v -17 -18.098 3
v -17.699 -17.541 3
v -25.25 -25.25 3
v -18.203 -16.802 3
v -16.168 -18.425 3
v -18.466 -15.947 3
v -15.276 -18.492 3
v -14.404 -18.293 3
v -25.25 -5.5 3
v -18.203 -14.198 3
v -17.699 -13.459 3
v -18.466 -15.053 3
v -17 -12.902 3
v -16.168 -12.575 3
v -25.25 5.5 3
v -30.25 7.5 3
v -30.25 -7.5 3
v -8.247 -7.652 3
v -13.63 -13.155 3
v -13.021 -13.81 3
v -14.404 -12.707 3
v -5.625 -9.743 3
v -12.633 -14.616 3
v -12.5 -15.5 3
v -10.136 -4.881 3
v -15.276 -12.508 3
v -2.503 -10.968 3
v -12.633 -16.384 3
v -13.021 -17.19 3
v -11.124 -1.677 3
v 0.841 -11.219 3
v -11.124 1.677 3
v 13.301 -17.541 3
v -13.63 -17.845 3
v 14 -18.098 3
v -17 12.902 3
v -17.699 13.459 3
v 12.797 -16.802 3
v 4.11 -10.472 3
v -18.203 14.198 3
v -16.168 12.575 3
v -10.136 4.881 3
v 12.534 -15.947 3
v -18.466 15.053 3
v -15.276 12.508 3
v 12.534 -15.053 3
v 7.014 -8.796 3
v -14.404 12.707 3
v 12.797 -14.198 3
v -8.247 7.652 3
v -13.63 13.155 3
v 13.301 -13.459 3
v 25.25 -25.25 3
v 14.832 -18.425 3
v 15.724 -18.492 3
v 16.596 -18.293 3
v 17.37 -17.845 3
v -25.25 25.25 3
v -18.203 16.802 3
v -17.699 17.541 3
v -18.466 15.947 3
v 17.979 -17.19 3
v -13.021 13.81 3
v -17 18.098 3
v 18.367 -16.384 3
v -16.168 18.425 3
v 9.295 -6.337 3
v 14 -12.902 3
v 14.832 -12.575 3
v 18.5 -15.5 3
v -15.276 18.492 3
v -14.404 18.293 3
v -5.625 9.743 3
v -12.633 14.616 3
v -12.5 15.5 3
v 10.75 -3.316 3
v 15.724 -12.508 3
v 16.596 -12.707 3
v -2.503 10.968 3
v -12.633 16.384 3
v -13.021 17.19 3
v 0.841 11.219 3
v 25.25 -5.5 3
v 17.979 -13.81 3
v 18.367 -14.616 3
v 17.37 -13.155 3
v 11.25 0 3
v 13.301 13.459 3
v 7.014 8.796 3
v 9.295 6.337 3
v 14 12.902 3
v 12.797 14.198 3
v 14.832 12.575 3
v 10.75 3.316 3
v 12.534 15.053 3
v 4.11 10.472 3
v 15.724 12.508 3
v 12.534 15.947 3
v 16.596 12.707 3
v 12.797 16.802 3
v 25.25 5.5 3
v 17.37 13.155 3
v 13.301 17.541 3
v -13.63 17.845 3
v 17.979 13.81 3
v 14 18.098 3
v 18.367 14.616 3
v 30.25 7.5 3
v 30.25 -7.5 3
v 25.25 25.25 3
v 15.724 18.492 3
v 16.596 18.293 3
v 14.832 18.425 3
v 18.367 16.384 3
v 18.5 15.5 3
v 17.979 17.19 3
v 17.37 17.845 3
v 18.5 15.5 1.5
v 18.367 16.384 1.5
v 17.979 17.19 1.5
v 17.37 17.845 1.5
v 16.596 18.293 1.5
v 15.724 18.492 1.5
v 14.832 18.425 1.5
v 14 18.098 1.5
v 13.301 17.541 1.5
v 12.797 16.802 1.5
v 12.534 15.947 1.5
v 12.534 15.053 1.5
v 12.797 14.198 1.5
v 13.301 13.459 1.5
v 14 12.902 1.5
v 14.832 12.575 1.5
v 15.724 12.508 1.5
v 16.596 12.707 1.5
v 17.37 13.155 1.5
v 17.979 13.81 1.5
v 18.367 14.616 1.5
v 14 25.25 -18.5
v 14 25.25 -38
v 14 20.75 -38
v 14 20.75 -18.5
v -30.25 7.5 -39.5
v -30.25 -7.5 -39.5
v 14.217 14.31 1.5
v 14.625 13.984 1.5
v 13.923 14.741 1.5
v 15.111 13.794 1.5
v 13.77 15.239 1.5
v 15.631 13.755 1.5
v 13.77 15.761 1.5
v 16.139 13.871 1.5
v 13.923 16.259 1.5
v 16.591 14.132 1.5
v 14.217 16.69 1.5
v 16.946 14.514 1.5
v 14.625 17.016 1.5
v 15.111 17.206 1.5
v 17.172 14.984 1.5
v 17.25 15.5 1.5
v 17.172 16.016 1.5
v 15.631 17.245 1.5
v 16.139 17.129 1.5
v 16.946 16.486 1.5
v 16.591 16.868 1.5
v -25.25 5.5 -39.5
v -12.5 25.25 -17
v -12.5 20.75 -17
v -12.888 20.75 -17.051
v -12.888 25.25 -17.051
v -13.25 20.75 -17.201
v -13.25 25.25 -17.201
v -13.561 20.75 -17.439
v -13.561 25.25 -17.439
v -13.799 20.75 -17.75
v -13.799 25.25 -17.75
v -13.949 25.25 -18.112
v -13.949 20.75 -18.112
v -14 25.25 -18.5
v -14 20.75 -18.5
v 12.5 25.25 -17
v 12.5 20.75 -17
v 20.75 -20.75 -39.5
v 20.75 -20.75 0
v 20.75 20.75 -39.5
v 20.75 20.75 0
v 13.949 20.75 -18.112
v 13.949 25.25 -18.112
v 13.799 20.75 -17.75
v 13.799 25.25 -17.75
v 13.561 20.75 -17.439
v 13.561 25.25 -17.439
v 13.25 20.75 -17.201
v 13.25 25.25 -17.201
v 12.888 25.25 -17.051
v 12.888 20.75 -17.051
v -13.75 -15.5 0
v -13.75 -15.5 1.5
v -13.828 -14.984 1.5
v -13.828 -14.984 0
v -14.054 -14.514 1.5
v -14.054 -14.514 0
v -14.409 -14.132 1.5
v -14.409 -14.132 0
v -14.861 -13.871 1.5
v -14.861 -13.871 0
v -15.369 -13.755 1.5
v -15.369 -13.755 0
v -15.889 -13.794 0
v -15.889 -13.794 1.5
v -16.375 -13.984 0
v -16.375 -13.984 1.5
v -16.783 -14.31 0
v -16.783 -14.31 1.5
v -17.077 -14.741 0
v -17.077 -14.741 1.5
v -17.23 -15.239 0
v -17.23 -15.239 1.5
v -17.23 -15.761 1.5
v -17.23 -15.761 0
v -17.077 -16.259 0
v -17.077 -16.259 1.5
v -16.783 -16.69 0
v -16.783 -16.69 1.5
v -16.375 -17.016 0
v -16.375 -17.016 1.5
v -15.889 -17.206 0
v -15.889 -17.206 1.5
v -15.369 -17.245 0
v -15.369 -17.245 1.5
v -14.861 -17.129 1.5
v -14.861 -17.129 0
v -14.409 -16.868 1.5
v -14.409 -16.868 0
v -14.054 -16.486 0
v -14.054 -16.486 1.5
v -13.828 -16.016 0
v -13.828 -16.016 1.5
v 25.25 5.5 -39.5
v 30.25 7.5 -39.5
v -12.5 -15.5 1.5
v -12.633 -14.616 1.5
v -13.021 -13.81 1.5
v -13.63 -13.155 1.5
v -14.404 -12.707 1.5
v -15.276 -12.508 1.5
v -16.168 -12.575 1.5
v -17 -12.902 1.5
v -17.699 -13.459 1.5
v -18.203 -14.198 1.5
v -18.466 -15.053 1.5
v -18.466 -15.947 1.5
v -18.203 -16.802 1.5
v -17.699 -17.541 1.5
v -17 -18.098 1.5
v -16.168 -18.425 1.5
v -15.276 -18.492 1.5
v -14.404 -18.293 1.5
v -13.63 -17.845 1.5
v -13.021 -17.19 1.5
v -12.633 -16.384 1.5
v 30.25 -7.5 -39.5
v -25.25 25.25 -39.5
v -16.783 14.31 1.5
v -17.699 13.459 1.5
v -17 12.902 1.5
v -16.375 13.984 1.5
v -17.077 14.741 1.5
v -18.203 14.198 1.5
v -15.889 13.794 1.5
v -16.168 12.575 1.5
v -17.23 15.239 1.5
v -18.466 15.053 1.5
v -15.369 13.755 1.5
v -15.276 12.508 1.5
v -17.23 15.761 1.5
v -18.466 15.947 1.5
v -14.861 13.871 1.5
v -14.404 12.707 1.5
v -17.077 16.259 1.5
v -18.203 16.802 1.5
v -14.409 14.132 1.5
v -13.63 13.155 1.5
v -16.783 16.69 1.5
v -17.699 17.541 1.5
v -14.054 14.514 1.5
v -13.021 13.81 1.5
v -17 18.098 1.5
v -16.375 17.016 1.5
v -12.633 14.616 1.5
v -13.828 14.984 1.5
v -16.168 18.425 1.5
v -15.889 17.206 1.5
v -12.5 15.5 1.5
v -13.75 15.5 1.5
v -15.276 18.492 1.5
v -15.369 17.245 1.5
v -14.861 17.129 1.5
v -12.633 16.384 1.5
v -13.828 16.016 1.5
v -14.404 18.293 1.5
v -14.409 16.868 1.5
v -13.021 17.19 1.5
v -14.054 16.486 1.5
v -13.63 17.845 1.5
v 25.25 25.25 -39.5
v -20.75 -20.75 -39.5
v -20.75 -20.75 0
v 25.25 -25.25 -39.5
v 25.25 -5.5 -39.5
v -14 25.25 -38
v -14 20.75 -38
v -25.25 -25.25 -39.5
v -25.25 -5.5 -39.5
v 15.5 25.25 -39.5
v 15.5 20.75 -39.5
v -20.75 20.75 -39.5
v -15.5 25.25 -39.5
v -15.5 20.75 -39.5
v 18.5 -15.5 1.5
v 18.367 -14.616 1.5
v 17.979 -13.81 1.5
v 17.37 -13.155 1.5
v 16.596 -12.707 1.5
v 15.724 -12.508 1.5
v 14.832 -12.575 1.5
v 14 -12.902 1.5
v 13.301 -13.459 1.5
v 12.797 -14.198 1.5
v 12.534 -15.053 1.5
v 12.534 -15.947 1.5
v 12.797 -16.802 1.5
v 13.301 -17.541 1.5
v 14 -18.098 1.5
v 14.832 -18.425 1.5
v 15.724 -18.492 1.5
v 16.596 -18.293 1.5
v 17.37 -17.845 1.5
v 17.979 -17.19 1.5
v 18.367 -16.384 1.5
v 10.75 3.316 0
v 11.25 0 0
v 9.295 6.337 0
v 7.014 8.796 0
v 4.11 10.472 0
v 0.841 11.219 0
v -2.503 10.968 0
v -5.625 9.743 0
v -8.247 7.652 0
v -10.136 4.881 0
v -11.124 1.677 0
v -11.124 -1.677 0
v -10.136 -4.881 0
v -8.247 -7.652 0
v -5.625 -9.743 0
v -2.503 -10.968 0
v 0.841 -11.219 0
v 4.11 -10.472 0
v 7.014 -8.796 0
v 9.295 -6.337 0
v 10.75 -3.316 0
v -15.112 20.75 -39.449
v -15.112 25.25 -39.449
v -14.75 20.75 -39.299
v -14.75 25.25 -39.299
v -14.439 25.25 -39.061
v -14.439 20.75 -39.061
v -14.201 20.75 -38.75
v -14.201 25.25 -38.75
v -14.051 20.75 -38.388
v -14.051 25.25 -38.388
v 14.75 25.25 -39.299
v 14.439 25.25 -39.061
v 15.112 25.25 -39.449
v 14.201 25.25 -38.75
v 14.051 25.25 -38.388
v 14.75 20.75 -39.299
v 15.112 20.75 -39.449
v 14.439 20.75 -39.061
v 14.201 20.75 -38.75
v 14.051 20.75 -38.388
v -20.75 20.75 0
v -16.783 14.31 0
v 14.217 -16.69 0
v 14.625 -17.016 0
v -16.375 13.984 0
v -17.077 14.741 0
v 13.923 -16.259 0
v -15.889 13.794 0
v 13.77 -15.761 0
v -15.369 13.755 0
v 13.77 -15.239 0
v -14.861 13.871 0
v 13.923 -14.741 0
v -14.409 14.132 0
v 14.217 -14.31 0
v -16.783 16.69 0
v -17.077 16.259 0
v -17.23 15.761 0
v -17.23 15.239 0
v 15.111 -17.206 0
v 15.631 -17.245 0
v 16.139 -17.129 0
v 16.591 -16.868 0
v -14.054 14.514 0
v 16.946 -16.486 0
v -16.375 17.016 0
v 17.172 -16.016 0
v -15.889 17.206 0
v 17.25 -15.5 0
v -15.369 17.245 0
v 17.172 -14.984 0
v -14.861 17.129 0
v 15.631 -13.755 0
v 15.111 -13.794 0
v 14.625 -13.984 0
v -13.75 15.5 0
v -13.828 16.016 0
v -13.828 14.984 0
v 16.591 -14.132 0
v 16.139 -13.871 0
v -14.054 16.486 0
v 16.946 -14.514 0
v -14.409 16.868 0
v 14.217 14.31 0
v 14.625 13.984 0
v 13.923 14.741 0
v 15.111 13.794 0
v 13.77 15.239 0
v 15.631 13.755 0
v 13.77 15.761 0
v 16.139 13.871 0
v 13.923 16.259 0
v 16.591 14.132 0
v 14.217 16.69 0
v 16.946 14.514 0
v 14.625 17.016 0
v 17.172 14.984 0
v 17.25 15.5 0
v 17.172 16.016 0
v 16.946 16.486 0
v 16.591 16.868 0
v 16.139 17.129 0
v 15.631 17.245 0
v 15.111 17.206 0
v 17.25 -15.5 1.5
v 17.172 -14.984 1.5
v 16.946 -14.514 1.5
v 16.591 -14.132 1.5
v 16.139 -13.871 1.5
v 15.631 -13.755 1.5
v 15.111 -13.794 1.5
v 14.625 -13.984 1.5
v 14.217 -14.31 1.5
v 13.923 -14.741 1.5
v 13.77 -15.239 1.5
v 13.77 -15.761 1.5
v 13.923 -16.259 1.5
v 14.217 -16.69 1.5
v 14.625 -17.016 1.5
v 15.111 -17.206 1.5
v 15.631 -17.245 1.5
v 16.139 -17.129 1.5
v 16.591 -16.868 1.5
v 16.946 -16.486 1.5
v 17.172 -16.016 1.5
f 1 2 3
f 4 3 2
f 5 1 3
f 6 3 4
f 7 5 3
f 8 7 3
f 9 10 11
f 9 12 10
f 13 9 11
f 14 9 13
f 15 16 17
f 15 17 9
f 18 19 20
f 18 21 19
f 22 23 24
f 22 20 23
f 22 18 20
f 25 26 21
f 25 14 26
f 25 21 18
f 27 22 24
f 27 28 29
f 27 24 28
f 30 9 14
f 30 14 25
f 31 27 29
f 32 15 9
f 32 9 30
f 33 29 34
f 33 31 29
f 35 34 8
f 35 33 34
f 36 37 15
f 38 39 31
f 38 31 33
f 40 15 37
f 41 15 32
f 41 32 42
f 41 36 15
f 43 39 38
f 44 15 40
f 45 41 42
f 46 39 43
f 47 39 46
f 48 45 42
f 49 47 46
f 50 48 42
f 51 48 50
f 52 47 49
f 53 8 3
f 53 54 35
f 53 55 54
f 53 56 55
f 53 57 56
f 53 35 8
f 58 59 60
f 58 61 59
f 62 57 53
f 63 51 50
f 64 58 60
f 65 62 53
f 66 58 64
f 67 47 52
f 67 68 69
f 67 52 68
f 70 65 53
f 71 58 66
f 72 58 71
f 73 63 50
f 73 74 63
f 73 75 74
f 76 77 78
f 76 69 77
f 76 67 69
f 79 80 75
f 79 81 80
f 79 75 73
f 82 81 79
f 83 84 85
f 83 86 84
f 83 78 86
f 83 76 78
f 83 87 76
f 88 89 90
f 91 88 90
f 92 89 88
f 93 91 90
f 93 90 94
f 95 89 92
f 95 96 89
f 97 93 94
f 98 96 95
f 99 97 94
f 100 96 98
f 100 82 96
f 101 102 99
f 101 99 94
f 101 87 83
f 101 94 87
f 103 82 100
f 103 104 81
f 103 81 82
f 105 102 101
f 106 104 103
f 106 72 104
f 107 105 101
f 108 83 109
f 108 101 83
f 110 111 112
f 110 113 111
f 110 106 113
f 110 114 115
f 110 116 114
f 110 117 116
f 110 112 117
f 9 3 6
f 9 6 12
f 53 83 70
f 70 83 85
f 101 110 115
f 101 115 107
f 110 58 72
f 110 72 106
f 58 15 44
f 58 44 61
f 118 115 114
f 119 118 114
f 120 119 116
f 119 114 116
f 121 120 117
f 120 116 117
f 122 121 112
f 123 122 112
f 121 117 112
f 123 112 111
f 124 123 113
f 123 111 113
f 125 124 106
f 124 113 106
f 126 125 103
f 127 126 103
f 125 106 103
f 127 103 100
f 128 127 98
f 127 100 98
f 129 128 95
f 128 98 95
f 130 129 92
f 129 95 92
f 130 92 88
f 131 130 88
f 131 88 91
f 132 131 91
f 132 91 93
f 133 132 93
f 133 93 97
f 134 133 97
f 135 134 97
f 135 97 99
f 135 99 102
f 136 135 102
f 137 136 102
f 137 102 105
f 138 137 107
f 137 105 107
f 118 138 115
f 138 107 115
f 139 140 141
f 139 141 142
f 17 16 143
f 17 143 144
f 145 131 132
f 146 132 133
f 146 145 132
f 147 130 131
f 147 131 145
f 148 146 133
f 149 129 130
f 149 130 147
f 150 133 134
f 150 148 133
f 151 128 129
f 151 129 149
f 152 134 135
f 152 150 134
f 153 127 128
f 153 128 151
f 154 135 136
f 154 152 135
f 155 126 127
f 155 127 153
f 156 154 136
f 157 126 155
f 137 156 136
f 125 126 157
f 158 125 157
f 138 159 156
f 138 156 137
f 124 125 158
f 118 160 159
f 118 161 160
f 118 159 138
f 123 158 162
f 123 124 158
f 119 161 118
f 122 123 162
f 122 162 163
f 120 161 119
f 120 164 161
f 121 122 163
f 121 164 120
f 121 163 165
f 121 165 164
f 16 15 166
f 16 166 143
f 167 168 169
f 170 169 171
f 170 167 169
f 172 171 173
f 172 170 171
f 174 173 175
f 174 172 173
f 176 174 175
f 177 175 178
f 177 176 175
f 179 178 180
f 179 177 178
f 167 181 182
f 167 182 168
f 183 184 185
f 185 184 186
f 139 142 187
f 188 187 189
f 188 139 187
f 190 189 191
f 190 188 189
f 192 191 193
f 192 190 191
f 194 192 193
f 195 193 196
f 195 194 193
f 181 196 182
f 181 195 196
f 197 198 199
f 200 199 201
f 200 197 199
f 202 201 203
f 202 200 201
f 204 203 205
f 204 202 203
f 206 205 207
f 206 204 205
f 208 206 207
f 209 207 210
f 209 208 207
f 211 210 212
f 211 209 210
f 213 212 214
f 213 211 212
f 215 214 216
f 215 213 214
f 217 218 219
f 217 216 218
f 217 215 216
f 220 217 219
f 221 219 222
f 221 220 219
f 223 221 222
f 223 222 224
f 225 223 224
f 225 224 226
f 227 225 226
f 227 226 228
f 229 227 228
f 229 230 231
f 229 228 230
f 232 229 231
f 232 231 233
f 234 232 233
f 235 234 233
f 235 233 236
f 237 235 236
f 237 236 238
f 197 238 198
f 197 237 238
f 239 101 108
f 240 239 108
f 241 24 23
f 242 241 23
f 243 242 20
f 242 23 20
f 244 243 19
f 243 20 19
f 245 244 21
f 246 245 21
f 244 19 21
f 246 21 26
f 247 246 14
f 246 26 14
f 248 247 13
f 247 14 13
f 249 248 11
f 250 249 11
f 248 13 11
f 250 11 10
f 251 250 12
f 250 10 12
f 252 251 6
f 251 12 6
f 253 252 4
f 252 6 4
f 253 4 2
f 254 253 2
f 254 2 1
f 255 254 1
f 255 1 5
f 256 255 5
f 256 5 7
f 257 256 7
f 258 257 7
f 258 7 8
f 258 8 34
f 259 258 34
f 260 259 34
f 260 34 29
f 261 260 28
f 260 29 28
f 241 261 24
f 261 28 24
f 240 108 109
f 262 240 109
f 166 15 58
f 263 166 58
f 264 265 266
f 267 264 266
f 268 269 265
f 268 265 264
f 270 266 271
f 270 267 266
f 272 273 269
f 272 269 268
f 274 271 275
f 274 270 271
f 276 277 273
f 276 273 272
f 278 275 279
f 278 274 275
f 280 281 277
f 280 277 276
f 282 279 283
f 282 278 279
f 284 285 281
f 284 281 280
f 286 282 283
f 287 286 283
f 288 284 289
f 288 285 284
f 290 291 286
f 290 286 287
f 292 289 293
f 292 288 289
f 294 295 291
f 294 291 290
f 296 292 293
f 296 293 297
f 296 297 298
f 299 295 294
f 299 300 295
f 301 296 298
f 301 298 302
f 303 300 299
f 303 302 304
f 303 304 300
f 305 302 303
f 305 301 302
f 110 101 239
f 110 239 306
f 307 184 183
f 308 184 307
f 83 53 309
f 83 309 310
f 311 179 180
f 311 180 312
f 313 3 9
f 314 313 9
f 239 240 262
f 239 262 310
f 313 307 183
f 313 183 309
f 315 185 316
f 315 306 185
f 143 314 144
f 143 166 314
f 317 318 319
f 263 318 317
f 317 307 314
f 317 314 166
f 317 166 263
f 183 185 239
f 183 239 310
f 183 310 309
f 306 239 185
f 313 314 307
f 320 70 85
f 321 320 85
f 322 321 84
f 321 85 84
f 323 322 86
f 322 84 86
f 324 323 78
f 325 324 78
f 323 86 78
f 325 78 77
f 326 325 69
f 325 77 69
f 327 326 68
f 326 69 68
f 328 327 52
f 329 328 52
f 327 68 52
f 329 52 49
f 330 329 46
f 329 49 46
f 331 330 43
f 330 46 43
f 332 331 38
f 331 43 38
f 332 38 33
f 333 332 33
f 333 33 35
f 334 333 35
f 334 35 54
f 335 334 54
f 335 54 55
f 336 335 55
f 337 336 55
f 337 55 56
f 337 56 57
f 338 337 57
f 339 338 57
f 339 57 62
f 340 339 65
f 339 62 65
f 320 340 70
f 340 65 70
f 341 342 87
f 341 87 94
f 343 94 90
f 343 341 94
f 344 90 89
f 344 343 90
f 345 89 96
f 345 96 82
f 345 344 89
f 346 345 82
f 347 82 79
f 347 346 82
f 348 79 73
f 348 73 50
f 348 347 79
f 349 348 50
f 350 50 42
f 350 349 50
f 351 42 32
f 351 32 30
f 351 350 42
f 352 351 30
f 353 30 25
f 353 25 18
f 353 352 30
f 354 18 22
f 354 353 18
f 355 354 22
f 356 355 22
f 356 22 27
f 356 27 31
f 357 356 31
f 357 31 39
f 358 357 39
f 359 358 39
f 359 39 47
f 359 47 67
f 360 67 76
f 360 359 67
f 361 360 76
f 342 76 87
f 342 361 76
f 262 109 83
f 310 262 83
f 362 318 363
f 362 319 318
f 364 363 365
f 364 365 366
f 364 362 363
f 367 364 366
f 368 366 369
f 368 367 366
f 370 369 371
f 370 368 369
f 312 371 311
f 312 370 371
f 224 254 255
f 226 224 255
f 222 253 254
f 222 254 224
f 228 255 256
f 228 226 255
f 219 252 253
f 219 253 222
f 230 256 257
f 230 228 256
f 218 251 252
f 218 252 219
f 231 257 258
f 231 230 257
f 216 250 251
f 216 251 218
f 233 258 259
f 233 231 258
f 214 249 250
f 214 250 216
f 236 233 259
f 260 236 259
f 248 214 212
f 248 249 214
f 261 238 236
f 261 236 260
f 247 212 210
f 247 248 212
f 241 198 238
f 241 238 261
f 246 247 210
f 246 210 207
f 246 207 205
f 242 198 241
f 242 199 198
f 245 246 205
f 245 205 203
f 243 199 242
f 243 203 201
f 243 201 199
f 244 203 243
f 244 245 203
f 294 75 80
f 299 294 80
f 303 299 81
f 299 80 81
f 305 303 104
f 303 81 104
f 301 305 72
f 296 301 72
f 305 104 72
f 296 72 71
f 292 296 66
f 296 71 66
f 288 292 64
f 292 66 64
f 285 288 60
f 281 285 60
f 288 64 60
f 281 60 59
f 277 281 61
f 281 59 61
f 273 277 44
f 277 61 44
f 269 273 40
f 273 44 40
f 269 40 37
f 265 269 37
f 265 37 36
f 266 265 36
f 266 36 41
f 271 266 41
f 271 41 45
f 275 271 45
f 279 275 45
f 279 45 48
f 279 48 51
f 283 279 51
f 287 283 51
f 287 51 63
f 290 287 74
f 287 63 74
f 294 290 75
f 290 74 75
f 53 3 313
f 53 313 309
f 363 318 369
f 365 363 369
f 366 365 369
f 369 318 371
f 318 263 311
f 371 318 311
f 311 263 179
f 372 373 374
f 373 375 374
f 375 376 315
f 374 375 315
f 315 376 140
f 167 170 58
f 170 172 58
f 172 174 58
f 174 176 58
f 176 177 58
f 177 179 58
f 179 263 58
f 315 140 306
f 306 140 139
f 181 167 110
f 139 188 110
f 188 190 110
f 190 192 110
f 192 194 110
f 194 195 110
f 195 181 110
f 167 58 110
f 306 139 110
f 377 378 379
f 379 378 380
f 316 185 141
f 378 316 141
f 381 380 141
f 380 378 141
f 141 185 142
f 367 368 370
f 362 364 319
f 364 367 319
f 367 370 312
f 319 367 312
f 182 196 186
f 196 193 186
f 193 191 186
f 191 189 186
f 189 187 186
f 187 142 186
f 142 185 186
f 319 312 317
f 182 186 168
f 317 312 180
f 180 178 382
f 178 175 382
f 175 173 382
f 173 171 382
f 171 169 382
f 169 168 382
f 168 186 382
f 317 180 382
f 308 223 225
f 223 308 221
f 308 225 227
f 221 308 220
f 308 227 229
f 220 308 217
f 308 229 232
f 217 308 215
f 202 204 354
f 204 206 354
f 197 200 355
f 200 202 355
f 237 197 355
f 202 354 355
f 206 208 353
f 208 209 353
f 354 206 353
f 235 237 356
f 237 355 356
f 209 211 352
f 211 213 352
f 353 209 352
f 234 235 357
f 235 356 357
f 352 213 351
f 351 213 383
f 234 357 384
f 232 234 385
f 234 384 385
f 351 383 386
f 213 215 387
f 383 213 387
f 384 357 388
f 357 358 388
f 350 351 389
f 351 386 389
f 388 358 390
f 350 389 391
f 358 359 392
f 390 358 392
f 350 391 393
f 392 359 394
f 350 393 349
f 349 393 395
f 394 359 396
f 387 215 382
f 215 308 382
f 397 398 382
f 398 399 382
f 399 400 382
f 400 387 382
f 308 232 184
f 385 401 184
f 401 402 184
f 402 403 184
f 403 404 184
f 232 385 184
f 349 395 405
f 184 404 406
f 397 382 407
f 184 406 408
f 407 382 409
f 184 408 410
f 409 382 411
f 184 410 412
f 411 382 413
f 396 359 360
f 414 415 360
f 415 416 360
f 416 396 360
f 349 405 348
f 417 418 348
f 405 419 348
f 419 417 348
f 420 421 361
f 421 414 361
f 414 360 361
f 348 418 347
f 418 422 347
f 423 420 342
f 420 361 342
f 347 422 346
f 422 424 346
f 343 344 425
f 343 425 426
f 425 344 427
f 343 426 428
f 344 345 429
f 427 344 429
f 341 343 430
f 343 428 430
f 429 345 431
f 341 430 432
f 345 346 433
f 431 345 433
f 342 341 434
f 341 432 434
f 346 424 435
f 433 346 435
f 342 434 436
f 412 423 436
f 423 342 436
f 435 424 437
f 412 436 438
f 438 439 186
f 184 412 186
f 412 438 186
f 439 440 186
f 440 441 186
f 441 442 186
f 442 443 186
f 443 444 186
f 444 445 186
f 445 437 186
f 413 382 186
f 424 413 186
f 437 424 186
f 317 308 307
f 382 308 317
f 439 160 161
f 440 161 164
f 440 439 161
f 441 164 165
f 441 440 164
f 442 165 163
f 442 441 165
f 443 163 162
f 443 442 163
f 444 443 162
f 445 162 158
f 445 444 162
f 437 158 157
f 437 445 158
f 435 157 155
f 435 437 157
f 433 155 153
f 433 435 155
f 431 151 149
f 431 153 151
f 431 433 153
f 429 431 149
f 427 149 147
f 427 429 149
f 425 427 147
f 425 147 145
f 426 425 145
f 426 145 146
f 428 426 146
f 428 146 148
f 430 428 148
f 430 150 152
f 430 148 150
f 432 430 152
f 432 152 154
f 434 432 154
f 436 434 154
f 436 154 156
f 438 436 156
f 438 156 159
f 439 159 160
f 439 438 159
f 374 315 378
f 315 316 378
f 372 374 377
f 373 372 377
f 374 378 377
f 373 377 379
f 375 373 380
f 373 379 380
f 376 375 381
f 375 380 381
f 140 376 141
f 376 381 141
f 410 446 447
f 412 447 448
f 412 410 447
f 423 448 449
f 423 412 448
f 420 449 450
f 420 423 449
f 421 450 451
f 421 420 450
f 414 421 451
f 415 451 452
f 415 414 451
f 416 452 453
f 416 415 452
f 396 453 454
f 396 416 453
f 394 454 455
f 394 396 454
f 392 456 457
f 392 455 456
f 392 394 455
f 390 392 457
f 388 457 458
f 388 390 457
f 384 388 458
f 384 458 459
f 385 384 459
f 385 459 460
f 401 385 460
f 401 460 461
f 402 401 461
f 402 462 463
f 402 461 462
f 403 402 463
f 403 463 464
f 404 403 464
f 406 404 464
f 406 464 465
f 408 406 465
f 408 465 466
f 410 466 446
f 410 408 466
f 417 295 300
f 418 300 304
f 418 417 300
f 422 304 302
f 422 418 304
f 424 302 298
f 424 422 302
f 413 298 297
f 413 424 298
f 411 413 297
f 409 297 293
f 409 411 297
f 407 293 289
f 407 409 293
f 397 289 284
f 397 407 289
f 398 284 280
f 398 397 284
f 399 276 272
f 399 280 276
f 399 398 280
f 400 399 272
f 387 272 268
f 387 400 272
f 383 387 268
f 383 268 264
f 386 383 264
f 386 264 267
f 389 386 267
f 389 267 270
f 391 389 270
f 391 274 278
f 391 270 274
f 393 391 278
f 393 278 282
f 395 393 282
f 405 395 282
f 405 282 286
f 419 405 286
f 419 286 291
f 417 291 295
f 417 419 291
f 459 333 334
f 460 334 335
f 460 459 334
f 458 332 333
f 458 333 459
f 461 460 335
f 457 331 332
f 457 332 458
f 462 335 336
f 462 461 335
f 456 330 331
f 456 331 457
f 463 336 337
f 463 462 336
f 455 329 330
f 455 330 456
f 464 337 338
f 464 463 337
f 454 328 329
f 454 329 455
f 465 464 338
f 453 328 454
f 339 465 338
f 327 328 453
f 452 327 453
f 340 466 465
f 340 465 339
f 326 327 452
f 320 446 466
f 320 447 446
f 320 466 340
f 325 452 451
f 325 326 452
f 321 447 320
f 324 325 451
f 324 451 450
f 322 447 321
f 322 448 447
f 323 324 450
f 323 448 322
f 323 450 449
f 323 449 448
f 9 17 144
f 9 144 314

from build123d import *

# Parameters (mm, degrees)
SKETCH1_W           = 50.5
SKETCH1_H           = 50.5
SKETCH1_R           = 11.25
SKETCH1_R_2         = 1.75
BOSS_EXTRUDE1_DEPTH = 3
SKETCH1_4_W         = 50.5
SKETCH1_4_H         = 50.5
SKETCH1_4_W_2       = 42.5
SKETCH1_4_H_2       = 42.5
BOSS_EXTRUDE2_DEPTH = 39.5
SKETCH6_W           = 42.5
SKETCH6_H           = 42.5
SKETCH6_W_2         = 41.5
SKETCH6_H_2         = 41.5
BOSS_EXTRUDE4_DEPTH = 39.5
CUT_EXTRUDE1_DEPTH  = 20
FILLET1_R           = 1.5
SKETCH4_R           = 3
CUT_EXTRUDE2_DEPTH  = 1.5
BOSS_EXTRUDE3_DEPTH = 42.5


with BuildPart() as part:
    # Sketch1 → Boss-Extrude1 (new body)
    with BuildSketch(Plane.XY):
        Rectangle(SKETCH1_W, SKETCH1_H)
        Circle(SKETCH1_R, mode=Mode.SUBTRACT)
        with Locations((-15.5, 15.5)):
            Circle(SKETCH1_R_2, mode=Mode.SUBTRACT)
        with Locations((15.5, 15.5)):
            Circle(SKETCH1_R_2, mode=Mode.SUBTRACT)
        with Locations((-15.5, -15.5)):
            Circle(SKETCH1_R_2, mode=Mode.SUBTRACT)
        with Locations((15.5, -15.5)):
            Circle(SKETCH1_R_2, mode=Mode.SUBTRACT)
    extrude(amount=BOSS_EXTRUDE1_DEPTH)

    # Sketch1<4> → Boss-Extrude2 (add)
    with BuildSketch(Plane.XY):
        Rectangle(SKETCH1_4_W, SKETCH1_4_H)
        Rectangle(SKETCH1_4_W_2, SKETCH1_4_H_2, mode=Mode.SUBTRACT)
    extrude(amount=-BOSS_EXTRUDE2_DEPTH)

    # Sketch6 → Boss-Extrude4 (add)
    with BuildSketch(Plane(origin=(0, 0, 0), x_dir=(-1, 0, 0), z_dir=(0, 0, -1))):
        Rectangle(SKETCH6_W, SKETCH6_H)
        Rectangle(SKETCH6_W_2, SKETCH6_H_2, mode=Mode.SUBTRACT)
    extrude(amount=BOSS_EXTRUDE4_DEPTH)

    # Sketch2 → Cut-Extrude1 (cut)
    with BuildSketch(Plane(origin=(0, 25.25, 0), x_dir=(1, 0, 0), z_dir=(0, 1, 0))):
        with BuildLine():
            Line((-14, 39.5), (14, 39.5))
            Line((14, 39.5), (14, 18.5))
            ThreePointArc((14, 18.5), (13.560660172, 17.439339828), (12.5, 17))
            Line((12.5, 17), (-12.5, 17))
            ThreePointArc((-12.5, 17), (-13.560660172, 17.439339828), (-14, 18.5))
            Line((-14, 18.5), (-14, 39.5))
        make_face()
    extrude(amount=-CUT_EXTRUDE1_DEPTH, mode=Mode.SUBTRACT)

    # Fillet1
    fillet1_edges = [part.edges().sort_by_distance(p)[0] for p in [
        (-14, 23, -39.5),
        (14, 23, -39.5),
    ]]
    fillet(fillet1_edges, radius=FILLET1_R)

    # Sketch4 → Cut-Extrude2 (cut)
    with BuildSketch(Plane.XY.offset(3)):
        with Locations((15.5, 15.5)):
            Circle(SKETCH4_R)
        with Locations((15.5, -15.5)):
            Circle(SKETCH4_R)
        with Locations((-15.5, 15.5)):
            Circle(SKETCH4_R)
        with Locations((-15.5, -15.5)):
            Circle(SKETCH4_R)
    extrude(amount=-CUT_EXTRUDE2_DEPTH, mode=Mode.SUBTRACT)

    # Sketch5 → Boss-Extrude3 (add)
    with BuildSketch(Plane.XY.offset(3)):
        Polygon((25.25, 5.5), (30.25, 7.5), (30.25, -7.5), (25.25, -5.5), align=None)
        Polygon((-30.25, -7.5), (-25.25, -5.5), (-25.25, 5.5), (-30.25, 7.5), align=None)
    extrude(amount=-BOSS_EXTRUDE3_DEPTH)


solid = part.part
